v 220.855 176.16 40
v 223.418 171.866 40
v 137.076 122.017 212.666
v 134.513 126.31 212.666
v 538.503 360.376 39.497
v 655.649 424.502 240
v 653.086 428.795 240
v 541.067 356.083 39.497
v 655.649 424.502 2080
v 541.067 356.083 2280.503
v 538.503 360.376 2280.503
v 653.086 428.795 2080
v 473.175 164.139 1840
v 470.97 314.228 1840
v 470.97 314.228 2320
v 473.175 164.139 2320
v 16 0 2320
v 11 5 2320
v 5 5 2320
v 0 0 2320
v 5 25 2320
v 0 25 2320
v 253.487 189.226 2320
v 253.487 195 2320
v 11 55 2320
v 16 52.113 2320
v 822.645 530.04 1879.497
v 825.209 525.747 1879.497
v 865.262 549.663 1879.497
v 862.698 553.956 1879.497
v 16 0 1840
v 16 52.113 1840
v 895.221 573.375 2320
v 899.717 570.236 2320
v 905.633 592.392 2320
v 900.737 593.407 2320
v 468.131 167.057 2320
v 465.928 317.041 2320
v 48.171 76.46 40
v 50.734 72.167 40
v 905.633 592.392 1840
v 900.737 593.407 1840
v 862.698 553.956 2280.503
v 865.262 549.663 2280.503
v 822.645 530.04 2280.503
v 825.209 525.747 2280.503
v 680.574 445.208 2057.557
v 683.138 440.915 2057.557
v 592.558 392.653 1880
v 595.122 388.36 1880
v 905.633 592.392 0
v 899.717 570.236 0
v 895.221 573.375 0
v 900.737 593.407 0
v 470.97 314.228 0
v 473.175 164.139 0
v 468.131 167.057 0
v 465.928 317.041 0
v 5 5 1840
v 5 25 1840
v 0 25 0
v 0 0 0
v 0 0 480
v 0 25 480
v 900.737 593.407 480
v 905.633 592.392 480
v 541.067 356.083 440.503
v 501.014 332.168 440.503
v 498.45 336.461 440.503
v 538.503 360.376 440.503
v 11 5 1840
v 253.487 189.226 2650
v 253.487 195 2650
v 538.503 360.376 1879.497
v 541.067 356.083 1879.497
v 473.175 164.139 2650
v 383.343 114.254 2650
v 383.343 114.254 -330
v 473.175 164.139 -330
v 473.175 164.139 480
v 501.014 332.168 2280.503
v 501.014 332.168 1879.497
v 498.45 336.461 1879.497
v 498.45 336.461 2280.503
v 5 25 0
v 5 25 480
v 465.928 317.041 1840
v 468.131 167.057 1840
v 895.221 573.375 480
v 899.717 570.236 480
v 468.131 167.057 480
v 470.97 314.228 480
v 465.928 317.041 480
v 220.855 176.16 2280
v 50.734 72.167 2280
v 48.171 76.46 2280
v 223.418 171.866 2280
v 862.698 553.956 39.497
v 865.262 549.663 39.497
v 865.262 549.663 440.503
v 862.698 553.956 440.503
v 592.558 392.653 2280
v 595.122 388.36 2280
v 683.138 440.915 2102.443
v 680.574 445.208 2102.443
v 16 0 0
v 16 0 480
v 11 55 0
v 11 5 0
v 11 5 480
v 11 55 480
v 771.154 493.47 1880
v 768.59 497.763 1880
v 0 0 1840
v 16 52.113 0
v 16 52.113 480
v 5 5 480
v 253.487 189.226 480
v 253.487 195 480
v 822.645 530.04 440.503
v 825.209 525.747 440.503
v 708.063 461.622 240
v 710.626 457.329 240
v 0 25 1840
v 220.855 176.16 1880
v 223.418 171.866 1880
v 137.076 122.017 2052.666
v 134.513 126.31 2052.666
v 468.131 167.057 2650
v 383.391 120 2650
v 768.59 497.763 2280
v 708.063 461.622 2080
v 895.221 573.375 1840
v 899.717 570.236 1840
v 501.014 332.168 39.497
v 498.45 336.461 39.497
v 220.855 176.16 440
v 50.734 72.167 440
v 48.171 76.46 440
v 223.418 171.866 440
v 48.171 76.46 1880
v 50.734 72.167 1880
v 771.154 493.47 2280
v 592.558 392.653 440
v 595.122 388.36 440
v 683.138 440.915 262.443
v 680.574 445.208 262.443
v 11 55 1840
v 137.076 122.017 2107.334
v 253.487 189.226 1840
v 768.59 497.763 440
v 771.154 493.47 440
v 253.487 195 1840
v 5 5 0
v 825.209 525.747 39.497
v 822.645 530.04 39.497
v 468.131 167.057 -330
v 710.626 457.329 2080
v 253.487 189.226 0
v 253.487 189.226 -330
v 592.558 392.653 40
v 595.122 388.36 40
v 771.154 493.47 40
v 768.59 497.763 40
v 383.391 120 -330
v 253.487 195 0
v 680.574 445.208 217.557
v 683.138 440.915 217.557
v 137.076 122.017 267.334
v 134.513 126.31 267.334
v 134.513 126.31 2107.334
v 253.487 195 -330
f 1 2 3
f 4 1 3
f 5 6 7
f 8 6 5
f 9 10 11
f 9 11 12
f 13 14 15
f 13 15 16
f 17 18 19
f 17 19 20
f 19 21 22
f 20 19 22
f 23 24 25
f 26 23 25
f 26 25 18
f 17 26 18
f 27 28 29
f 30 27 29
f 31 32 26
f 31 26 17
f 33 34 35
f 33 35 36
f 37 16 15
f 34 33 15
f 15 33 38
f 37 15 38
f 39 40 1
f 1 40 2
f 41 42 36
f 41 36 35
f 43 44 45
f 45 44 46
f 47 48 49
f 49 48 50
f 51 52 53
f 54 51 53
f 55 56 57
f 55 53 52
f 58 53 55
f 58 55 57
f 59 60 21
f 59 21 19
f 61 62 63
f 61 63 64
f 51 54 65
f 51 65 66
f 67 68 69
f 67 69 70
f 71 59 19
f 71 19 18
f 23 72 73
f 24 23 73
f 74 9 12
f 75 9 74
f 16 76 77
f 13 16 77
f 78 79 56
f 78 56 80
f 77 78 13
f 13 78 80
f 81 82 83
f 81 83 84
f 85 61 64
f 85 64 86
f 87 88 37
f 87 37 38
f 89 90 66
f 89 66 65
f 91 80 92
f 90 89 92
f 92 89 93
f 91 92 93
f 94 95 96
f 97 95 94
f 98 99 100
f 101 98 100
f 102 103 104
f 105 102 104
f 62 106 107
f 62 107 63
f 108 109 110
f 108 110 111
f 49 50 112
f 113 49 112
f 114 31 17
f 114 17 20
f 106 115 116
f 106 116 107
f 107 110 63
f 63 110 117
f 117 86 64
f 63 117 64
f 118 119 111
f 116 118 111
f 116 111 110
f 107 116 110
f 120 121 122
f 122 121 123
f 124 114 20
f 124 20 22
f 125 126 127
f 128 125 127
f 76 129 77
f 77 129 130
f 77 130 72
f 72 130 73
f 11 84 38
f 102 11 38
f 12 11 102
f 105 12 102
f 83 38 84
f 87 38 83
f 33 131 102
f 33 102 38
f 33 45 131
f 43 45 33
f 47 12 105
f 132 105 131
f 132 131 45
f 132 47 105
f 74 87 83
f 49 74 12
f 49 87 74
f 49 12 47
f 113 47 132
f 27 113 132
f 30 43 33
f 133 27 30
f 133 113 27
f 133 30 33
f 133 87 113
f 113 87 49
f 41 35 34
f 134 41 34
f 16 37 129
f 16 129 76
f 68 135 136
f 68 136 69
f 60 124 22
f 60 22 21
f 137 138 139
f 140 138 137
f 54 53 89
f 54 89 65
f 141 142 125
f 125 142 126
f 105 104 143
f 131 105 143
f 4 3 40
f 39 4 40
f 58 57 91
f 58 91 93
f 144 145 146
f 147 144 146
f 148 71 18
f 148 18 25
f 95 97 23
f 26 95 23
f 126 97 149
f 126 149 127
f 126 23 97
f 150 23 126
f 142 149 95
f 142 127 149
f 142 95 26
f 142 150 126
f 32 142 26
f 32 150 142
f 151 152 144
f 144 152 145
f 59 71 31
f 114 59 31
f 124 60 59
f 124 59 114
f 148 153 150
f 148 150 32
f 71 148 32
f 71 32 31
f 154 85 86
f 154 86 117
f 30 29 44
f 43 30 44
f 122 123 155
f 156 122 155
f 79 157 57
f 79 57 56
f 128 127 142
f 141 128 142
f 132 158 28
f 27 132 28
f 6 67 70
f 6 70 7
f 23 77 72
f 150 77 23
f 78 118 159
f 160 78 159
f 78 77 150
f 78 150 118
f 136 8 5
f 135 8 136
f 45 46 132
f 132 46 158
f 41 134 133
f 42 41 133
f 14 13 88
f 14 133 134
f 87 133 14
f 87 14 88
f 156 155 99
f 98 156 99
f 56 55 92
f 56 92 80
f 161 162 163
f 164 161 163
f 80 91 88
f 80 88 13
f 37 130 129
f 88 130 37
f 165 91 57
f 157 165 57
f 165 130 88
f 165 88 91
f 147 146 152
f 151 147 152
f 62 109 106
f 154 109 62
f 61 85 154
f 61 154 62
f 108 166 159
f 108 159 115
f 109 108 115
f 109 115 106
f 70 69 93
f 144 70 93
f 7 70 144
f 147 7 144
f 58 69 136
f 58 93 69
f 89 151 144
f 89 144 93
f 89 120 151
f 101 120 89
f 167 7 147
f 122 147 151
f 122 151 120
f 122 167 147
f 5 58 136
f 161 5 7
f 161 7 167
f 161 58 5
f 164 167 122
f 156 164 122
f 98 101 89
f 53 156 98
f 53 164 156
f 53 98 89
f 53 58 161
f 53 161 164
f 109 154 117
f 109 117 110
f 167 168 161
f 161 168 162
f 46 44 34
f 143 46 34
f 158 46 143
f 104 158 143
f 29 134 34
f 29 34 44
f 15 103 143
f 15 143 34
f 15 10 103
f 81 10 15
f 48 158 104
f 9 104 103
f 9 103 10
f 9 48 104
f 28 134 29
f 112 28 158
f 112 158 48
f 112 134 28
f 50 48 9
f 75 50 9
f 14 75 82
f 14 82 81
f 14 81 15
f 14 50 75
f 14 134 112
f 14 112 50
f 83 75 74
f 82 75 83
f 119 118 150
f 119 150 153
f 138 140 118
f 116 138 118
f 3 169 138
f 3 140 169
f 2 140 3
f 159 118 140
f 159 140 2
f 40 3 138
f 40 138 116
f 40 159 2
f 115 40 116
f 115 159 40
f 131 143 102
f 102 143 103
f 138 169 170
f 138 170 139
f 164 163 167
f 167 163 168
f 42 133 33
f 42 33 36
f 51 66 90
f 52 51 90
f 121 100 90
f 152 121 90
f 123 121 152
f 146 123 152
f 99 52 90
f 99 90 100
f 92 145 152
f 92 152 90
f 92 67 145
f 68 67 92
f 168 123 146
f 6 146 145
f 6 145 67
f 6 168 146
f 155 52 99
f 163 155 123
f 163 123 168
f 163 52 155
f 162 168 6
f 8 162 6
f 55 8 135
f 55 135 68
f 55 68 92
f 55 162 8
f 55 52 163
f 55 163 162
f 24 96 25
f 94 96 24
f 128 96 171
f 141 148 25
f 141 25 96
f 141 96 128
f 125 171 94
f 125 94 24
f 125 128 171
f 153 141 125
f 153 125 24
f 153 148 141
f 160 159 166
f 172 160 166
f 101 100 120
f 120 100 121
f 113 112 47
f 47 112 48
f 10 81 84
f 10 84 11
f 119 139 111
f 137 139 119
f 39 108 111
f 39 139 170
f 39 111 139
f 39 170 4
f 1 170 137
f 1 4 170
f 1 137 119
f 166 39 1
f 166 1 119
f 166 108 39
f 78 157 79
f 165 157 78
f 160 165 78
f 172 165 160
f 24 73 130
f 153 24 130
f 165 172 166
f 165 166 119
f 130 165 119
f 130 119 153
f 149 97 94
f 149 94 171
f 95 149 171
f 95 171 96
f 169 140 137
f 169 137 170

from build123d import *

# Parameters (mm, degrees)
BOSS_EXTRUDE1_DEPTH      = 480
BOSS_EXTRUDE2_DEPTH      = 1360
BOSS_EXTRUDE2_DEPTH_BACK = 810
BOSS_EXTRUDE3_DEPTH      = 480
BOSS_EXTRUDE4_DEPTH      = 330
CUT_EXTRUDE1_DEPTH       = 10
CUT_EXTRUDE1_DEPTH_BACK  = 30


with BuildPart() as part:
    # Sketch1 → Boss-Extrude1 (new body)
    with BuildSketch(Plane.XY):
        Polygon((11, 5), (11, 55), (253.48711306, 195), (383.390923627, 120), (468.131254081, 167.057169747), (465.927689259, 317.040983214), (895.221056619, 573.375149374), (900.737119771, 593.40706864), (905.633033208, 592.392159546), (899.716918706, 570.236137585), (470.969557333, 314.227995539), (473.174672886, 164.138632802), (383.342980003, 114.254177572), (253.48711306, 189.226497308), (16, 52.113248654), (16, 0), (0, 0), (0, 25), (5, 25), (5, 5), align=None)
    extrude(amount=BOSS_EXTRUDE1_DEPTH)

    # Sketch3 → Boss-Extrude2 (add, two sides: drawn at the far end of the back side and taken through both)
    with BuildSketch(Plane.XY.offset(480).offset(-BOSS_EXTRUDE2_DEPTH_BACK)):
        Polygon((253.48711306, 195), (383.390923627, 120), (468.131254081, 167.057169747), (473.174672886, 164.138632802), (383.342980003, 114.254177572), (253.48711306, 189.226497308), align=None)
    extrude(amount=BOSS_EXTRUDE2_DEPTH + BOSS_EXTRUDE2_DEPTH_BACK)

    # Sketch4 → Boss-Extrude3 (add)
    with BuildSketch(Plane.XY.offset(1840)):
        Polygon((0, 25), (5, 25), (5, 5), (11, 5), (11, 55), (253.48711306, 195), (383.390923627, 120), (468.131254081, 167.057169747), (465.927689259, 317.040983214), (895.221056619, 573.375149374), (900.737119771, 593.40706864), (905.633033208, 592.392159546), (899.716918706, 570.236137585), (470.969557333, 314.227995539), (473.174672886, 164.138632802), (383.342980003, 114.254177572), (253.48711306, 189.226497308), (16, 52.113248654), (16, 0), (0, 0), align=None)
    extrude(amount=BOSS_EXTRUDE3_DEPTH)

    # Sketch5 → Boss-Extrude4 (add)
    with BuildSketch(Plane.XY.offset(2320)):
        Polygon((253.48711306, 195), (383.390923627, 120), (468.131254081, 167.057169747), (473.174672886, 164.138632802), (383.342980003, 114.254177572), (253.48711306, 189.226497308), align=None)
    extrude(amount=BOSS_EXTRUDE4_DEPTH)

    # Sketch8 → Cut-Extrude1 (cut, two sides: drawn at the far end of the back side and taken through both)
    with BuildSketch(Plane(origin=(-17.092778033, 28.625978149, 0), x_dir=(0.8585867347200433, 0.5126683323190285, 0), z_dir=(-0.5126683323190286, 0.8585867347200434, 0)).offset(-CUT_EXTRUDE1_DEPTH_BACK)):
        Polygon((710.063615933, -40), (915.088795023, -40), (812.576205478, -217.557013508), align=None)
        Polygon((780.560416253, -240), (647.105417063, -39.497463328), (600.455591152, -39.497463328), (600.455591152, -440.502536672), (647.105417063, -440.502536672), align=None)
        Polygon((844.591994703, -240), (978.046993893, -39.497463328), (1024.696819804, -39.497463328), (1024.696819804, -440.502536672), (978.046993893, -440.502536672), align=None)
        Polygon((812.576205478, -262.442986492), (915.088795023, -440), (710.063615933, -440), align=None)
        Polygon((80.557501261, -440), (279.934557694, -440), (180.246029478, -267.334404198), align=None)
        Polygon((80.557501261, -40), (279.934557694, -40), (180.246029478, -212.665595802), align=None)
        Polygon((710.063615933, -1880), (915.088795023, -1880), (812.576205478, -2057.557013508), align=None)
        Polygon((978.046993893, -1879.497463328), (1024.696819804, -1879.497463328), (1024.696819804, -2280.502536672), (978.046993893, -2280.502536672), (844.591994703, -2080), align=None)
        Polygon((812.576205478, -2102.442986492), (915.088795023, -2280), (710.063615933, -2280), align=None)
        Polygon((780.560416253, -2080), (647.105417063, -1879.497463328), (600.455591152, -1879.497463328), (600.455591152, -2280.502536672), (647.105417063, -2280.502536672), align=None)
        Polygon((80.557501261, -1880), (279.934557694, -1880), (180.246029478, -2052.665595802), align=None)
        Polygon((279.934557694, -2280), (180.246029478, -2107.334404198), (80.557501261, -2280), align=None)
    extrude(amount=CUT_EXTRUDE1_DEPTH + CUT_EXTRUDE1_DEPTH_BACK, mode=Mode.SUBTRACT)


solid = part.part
